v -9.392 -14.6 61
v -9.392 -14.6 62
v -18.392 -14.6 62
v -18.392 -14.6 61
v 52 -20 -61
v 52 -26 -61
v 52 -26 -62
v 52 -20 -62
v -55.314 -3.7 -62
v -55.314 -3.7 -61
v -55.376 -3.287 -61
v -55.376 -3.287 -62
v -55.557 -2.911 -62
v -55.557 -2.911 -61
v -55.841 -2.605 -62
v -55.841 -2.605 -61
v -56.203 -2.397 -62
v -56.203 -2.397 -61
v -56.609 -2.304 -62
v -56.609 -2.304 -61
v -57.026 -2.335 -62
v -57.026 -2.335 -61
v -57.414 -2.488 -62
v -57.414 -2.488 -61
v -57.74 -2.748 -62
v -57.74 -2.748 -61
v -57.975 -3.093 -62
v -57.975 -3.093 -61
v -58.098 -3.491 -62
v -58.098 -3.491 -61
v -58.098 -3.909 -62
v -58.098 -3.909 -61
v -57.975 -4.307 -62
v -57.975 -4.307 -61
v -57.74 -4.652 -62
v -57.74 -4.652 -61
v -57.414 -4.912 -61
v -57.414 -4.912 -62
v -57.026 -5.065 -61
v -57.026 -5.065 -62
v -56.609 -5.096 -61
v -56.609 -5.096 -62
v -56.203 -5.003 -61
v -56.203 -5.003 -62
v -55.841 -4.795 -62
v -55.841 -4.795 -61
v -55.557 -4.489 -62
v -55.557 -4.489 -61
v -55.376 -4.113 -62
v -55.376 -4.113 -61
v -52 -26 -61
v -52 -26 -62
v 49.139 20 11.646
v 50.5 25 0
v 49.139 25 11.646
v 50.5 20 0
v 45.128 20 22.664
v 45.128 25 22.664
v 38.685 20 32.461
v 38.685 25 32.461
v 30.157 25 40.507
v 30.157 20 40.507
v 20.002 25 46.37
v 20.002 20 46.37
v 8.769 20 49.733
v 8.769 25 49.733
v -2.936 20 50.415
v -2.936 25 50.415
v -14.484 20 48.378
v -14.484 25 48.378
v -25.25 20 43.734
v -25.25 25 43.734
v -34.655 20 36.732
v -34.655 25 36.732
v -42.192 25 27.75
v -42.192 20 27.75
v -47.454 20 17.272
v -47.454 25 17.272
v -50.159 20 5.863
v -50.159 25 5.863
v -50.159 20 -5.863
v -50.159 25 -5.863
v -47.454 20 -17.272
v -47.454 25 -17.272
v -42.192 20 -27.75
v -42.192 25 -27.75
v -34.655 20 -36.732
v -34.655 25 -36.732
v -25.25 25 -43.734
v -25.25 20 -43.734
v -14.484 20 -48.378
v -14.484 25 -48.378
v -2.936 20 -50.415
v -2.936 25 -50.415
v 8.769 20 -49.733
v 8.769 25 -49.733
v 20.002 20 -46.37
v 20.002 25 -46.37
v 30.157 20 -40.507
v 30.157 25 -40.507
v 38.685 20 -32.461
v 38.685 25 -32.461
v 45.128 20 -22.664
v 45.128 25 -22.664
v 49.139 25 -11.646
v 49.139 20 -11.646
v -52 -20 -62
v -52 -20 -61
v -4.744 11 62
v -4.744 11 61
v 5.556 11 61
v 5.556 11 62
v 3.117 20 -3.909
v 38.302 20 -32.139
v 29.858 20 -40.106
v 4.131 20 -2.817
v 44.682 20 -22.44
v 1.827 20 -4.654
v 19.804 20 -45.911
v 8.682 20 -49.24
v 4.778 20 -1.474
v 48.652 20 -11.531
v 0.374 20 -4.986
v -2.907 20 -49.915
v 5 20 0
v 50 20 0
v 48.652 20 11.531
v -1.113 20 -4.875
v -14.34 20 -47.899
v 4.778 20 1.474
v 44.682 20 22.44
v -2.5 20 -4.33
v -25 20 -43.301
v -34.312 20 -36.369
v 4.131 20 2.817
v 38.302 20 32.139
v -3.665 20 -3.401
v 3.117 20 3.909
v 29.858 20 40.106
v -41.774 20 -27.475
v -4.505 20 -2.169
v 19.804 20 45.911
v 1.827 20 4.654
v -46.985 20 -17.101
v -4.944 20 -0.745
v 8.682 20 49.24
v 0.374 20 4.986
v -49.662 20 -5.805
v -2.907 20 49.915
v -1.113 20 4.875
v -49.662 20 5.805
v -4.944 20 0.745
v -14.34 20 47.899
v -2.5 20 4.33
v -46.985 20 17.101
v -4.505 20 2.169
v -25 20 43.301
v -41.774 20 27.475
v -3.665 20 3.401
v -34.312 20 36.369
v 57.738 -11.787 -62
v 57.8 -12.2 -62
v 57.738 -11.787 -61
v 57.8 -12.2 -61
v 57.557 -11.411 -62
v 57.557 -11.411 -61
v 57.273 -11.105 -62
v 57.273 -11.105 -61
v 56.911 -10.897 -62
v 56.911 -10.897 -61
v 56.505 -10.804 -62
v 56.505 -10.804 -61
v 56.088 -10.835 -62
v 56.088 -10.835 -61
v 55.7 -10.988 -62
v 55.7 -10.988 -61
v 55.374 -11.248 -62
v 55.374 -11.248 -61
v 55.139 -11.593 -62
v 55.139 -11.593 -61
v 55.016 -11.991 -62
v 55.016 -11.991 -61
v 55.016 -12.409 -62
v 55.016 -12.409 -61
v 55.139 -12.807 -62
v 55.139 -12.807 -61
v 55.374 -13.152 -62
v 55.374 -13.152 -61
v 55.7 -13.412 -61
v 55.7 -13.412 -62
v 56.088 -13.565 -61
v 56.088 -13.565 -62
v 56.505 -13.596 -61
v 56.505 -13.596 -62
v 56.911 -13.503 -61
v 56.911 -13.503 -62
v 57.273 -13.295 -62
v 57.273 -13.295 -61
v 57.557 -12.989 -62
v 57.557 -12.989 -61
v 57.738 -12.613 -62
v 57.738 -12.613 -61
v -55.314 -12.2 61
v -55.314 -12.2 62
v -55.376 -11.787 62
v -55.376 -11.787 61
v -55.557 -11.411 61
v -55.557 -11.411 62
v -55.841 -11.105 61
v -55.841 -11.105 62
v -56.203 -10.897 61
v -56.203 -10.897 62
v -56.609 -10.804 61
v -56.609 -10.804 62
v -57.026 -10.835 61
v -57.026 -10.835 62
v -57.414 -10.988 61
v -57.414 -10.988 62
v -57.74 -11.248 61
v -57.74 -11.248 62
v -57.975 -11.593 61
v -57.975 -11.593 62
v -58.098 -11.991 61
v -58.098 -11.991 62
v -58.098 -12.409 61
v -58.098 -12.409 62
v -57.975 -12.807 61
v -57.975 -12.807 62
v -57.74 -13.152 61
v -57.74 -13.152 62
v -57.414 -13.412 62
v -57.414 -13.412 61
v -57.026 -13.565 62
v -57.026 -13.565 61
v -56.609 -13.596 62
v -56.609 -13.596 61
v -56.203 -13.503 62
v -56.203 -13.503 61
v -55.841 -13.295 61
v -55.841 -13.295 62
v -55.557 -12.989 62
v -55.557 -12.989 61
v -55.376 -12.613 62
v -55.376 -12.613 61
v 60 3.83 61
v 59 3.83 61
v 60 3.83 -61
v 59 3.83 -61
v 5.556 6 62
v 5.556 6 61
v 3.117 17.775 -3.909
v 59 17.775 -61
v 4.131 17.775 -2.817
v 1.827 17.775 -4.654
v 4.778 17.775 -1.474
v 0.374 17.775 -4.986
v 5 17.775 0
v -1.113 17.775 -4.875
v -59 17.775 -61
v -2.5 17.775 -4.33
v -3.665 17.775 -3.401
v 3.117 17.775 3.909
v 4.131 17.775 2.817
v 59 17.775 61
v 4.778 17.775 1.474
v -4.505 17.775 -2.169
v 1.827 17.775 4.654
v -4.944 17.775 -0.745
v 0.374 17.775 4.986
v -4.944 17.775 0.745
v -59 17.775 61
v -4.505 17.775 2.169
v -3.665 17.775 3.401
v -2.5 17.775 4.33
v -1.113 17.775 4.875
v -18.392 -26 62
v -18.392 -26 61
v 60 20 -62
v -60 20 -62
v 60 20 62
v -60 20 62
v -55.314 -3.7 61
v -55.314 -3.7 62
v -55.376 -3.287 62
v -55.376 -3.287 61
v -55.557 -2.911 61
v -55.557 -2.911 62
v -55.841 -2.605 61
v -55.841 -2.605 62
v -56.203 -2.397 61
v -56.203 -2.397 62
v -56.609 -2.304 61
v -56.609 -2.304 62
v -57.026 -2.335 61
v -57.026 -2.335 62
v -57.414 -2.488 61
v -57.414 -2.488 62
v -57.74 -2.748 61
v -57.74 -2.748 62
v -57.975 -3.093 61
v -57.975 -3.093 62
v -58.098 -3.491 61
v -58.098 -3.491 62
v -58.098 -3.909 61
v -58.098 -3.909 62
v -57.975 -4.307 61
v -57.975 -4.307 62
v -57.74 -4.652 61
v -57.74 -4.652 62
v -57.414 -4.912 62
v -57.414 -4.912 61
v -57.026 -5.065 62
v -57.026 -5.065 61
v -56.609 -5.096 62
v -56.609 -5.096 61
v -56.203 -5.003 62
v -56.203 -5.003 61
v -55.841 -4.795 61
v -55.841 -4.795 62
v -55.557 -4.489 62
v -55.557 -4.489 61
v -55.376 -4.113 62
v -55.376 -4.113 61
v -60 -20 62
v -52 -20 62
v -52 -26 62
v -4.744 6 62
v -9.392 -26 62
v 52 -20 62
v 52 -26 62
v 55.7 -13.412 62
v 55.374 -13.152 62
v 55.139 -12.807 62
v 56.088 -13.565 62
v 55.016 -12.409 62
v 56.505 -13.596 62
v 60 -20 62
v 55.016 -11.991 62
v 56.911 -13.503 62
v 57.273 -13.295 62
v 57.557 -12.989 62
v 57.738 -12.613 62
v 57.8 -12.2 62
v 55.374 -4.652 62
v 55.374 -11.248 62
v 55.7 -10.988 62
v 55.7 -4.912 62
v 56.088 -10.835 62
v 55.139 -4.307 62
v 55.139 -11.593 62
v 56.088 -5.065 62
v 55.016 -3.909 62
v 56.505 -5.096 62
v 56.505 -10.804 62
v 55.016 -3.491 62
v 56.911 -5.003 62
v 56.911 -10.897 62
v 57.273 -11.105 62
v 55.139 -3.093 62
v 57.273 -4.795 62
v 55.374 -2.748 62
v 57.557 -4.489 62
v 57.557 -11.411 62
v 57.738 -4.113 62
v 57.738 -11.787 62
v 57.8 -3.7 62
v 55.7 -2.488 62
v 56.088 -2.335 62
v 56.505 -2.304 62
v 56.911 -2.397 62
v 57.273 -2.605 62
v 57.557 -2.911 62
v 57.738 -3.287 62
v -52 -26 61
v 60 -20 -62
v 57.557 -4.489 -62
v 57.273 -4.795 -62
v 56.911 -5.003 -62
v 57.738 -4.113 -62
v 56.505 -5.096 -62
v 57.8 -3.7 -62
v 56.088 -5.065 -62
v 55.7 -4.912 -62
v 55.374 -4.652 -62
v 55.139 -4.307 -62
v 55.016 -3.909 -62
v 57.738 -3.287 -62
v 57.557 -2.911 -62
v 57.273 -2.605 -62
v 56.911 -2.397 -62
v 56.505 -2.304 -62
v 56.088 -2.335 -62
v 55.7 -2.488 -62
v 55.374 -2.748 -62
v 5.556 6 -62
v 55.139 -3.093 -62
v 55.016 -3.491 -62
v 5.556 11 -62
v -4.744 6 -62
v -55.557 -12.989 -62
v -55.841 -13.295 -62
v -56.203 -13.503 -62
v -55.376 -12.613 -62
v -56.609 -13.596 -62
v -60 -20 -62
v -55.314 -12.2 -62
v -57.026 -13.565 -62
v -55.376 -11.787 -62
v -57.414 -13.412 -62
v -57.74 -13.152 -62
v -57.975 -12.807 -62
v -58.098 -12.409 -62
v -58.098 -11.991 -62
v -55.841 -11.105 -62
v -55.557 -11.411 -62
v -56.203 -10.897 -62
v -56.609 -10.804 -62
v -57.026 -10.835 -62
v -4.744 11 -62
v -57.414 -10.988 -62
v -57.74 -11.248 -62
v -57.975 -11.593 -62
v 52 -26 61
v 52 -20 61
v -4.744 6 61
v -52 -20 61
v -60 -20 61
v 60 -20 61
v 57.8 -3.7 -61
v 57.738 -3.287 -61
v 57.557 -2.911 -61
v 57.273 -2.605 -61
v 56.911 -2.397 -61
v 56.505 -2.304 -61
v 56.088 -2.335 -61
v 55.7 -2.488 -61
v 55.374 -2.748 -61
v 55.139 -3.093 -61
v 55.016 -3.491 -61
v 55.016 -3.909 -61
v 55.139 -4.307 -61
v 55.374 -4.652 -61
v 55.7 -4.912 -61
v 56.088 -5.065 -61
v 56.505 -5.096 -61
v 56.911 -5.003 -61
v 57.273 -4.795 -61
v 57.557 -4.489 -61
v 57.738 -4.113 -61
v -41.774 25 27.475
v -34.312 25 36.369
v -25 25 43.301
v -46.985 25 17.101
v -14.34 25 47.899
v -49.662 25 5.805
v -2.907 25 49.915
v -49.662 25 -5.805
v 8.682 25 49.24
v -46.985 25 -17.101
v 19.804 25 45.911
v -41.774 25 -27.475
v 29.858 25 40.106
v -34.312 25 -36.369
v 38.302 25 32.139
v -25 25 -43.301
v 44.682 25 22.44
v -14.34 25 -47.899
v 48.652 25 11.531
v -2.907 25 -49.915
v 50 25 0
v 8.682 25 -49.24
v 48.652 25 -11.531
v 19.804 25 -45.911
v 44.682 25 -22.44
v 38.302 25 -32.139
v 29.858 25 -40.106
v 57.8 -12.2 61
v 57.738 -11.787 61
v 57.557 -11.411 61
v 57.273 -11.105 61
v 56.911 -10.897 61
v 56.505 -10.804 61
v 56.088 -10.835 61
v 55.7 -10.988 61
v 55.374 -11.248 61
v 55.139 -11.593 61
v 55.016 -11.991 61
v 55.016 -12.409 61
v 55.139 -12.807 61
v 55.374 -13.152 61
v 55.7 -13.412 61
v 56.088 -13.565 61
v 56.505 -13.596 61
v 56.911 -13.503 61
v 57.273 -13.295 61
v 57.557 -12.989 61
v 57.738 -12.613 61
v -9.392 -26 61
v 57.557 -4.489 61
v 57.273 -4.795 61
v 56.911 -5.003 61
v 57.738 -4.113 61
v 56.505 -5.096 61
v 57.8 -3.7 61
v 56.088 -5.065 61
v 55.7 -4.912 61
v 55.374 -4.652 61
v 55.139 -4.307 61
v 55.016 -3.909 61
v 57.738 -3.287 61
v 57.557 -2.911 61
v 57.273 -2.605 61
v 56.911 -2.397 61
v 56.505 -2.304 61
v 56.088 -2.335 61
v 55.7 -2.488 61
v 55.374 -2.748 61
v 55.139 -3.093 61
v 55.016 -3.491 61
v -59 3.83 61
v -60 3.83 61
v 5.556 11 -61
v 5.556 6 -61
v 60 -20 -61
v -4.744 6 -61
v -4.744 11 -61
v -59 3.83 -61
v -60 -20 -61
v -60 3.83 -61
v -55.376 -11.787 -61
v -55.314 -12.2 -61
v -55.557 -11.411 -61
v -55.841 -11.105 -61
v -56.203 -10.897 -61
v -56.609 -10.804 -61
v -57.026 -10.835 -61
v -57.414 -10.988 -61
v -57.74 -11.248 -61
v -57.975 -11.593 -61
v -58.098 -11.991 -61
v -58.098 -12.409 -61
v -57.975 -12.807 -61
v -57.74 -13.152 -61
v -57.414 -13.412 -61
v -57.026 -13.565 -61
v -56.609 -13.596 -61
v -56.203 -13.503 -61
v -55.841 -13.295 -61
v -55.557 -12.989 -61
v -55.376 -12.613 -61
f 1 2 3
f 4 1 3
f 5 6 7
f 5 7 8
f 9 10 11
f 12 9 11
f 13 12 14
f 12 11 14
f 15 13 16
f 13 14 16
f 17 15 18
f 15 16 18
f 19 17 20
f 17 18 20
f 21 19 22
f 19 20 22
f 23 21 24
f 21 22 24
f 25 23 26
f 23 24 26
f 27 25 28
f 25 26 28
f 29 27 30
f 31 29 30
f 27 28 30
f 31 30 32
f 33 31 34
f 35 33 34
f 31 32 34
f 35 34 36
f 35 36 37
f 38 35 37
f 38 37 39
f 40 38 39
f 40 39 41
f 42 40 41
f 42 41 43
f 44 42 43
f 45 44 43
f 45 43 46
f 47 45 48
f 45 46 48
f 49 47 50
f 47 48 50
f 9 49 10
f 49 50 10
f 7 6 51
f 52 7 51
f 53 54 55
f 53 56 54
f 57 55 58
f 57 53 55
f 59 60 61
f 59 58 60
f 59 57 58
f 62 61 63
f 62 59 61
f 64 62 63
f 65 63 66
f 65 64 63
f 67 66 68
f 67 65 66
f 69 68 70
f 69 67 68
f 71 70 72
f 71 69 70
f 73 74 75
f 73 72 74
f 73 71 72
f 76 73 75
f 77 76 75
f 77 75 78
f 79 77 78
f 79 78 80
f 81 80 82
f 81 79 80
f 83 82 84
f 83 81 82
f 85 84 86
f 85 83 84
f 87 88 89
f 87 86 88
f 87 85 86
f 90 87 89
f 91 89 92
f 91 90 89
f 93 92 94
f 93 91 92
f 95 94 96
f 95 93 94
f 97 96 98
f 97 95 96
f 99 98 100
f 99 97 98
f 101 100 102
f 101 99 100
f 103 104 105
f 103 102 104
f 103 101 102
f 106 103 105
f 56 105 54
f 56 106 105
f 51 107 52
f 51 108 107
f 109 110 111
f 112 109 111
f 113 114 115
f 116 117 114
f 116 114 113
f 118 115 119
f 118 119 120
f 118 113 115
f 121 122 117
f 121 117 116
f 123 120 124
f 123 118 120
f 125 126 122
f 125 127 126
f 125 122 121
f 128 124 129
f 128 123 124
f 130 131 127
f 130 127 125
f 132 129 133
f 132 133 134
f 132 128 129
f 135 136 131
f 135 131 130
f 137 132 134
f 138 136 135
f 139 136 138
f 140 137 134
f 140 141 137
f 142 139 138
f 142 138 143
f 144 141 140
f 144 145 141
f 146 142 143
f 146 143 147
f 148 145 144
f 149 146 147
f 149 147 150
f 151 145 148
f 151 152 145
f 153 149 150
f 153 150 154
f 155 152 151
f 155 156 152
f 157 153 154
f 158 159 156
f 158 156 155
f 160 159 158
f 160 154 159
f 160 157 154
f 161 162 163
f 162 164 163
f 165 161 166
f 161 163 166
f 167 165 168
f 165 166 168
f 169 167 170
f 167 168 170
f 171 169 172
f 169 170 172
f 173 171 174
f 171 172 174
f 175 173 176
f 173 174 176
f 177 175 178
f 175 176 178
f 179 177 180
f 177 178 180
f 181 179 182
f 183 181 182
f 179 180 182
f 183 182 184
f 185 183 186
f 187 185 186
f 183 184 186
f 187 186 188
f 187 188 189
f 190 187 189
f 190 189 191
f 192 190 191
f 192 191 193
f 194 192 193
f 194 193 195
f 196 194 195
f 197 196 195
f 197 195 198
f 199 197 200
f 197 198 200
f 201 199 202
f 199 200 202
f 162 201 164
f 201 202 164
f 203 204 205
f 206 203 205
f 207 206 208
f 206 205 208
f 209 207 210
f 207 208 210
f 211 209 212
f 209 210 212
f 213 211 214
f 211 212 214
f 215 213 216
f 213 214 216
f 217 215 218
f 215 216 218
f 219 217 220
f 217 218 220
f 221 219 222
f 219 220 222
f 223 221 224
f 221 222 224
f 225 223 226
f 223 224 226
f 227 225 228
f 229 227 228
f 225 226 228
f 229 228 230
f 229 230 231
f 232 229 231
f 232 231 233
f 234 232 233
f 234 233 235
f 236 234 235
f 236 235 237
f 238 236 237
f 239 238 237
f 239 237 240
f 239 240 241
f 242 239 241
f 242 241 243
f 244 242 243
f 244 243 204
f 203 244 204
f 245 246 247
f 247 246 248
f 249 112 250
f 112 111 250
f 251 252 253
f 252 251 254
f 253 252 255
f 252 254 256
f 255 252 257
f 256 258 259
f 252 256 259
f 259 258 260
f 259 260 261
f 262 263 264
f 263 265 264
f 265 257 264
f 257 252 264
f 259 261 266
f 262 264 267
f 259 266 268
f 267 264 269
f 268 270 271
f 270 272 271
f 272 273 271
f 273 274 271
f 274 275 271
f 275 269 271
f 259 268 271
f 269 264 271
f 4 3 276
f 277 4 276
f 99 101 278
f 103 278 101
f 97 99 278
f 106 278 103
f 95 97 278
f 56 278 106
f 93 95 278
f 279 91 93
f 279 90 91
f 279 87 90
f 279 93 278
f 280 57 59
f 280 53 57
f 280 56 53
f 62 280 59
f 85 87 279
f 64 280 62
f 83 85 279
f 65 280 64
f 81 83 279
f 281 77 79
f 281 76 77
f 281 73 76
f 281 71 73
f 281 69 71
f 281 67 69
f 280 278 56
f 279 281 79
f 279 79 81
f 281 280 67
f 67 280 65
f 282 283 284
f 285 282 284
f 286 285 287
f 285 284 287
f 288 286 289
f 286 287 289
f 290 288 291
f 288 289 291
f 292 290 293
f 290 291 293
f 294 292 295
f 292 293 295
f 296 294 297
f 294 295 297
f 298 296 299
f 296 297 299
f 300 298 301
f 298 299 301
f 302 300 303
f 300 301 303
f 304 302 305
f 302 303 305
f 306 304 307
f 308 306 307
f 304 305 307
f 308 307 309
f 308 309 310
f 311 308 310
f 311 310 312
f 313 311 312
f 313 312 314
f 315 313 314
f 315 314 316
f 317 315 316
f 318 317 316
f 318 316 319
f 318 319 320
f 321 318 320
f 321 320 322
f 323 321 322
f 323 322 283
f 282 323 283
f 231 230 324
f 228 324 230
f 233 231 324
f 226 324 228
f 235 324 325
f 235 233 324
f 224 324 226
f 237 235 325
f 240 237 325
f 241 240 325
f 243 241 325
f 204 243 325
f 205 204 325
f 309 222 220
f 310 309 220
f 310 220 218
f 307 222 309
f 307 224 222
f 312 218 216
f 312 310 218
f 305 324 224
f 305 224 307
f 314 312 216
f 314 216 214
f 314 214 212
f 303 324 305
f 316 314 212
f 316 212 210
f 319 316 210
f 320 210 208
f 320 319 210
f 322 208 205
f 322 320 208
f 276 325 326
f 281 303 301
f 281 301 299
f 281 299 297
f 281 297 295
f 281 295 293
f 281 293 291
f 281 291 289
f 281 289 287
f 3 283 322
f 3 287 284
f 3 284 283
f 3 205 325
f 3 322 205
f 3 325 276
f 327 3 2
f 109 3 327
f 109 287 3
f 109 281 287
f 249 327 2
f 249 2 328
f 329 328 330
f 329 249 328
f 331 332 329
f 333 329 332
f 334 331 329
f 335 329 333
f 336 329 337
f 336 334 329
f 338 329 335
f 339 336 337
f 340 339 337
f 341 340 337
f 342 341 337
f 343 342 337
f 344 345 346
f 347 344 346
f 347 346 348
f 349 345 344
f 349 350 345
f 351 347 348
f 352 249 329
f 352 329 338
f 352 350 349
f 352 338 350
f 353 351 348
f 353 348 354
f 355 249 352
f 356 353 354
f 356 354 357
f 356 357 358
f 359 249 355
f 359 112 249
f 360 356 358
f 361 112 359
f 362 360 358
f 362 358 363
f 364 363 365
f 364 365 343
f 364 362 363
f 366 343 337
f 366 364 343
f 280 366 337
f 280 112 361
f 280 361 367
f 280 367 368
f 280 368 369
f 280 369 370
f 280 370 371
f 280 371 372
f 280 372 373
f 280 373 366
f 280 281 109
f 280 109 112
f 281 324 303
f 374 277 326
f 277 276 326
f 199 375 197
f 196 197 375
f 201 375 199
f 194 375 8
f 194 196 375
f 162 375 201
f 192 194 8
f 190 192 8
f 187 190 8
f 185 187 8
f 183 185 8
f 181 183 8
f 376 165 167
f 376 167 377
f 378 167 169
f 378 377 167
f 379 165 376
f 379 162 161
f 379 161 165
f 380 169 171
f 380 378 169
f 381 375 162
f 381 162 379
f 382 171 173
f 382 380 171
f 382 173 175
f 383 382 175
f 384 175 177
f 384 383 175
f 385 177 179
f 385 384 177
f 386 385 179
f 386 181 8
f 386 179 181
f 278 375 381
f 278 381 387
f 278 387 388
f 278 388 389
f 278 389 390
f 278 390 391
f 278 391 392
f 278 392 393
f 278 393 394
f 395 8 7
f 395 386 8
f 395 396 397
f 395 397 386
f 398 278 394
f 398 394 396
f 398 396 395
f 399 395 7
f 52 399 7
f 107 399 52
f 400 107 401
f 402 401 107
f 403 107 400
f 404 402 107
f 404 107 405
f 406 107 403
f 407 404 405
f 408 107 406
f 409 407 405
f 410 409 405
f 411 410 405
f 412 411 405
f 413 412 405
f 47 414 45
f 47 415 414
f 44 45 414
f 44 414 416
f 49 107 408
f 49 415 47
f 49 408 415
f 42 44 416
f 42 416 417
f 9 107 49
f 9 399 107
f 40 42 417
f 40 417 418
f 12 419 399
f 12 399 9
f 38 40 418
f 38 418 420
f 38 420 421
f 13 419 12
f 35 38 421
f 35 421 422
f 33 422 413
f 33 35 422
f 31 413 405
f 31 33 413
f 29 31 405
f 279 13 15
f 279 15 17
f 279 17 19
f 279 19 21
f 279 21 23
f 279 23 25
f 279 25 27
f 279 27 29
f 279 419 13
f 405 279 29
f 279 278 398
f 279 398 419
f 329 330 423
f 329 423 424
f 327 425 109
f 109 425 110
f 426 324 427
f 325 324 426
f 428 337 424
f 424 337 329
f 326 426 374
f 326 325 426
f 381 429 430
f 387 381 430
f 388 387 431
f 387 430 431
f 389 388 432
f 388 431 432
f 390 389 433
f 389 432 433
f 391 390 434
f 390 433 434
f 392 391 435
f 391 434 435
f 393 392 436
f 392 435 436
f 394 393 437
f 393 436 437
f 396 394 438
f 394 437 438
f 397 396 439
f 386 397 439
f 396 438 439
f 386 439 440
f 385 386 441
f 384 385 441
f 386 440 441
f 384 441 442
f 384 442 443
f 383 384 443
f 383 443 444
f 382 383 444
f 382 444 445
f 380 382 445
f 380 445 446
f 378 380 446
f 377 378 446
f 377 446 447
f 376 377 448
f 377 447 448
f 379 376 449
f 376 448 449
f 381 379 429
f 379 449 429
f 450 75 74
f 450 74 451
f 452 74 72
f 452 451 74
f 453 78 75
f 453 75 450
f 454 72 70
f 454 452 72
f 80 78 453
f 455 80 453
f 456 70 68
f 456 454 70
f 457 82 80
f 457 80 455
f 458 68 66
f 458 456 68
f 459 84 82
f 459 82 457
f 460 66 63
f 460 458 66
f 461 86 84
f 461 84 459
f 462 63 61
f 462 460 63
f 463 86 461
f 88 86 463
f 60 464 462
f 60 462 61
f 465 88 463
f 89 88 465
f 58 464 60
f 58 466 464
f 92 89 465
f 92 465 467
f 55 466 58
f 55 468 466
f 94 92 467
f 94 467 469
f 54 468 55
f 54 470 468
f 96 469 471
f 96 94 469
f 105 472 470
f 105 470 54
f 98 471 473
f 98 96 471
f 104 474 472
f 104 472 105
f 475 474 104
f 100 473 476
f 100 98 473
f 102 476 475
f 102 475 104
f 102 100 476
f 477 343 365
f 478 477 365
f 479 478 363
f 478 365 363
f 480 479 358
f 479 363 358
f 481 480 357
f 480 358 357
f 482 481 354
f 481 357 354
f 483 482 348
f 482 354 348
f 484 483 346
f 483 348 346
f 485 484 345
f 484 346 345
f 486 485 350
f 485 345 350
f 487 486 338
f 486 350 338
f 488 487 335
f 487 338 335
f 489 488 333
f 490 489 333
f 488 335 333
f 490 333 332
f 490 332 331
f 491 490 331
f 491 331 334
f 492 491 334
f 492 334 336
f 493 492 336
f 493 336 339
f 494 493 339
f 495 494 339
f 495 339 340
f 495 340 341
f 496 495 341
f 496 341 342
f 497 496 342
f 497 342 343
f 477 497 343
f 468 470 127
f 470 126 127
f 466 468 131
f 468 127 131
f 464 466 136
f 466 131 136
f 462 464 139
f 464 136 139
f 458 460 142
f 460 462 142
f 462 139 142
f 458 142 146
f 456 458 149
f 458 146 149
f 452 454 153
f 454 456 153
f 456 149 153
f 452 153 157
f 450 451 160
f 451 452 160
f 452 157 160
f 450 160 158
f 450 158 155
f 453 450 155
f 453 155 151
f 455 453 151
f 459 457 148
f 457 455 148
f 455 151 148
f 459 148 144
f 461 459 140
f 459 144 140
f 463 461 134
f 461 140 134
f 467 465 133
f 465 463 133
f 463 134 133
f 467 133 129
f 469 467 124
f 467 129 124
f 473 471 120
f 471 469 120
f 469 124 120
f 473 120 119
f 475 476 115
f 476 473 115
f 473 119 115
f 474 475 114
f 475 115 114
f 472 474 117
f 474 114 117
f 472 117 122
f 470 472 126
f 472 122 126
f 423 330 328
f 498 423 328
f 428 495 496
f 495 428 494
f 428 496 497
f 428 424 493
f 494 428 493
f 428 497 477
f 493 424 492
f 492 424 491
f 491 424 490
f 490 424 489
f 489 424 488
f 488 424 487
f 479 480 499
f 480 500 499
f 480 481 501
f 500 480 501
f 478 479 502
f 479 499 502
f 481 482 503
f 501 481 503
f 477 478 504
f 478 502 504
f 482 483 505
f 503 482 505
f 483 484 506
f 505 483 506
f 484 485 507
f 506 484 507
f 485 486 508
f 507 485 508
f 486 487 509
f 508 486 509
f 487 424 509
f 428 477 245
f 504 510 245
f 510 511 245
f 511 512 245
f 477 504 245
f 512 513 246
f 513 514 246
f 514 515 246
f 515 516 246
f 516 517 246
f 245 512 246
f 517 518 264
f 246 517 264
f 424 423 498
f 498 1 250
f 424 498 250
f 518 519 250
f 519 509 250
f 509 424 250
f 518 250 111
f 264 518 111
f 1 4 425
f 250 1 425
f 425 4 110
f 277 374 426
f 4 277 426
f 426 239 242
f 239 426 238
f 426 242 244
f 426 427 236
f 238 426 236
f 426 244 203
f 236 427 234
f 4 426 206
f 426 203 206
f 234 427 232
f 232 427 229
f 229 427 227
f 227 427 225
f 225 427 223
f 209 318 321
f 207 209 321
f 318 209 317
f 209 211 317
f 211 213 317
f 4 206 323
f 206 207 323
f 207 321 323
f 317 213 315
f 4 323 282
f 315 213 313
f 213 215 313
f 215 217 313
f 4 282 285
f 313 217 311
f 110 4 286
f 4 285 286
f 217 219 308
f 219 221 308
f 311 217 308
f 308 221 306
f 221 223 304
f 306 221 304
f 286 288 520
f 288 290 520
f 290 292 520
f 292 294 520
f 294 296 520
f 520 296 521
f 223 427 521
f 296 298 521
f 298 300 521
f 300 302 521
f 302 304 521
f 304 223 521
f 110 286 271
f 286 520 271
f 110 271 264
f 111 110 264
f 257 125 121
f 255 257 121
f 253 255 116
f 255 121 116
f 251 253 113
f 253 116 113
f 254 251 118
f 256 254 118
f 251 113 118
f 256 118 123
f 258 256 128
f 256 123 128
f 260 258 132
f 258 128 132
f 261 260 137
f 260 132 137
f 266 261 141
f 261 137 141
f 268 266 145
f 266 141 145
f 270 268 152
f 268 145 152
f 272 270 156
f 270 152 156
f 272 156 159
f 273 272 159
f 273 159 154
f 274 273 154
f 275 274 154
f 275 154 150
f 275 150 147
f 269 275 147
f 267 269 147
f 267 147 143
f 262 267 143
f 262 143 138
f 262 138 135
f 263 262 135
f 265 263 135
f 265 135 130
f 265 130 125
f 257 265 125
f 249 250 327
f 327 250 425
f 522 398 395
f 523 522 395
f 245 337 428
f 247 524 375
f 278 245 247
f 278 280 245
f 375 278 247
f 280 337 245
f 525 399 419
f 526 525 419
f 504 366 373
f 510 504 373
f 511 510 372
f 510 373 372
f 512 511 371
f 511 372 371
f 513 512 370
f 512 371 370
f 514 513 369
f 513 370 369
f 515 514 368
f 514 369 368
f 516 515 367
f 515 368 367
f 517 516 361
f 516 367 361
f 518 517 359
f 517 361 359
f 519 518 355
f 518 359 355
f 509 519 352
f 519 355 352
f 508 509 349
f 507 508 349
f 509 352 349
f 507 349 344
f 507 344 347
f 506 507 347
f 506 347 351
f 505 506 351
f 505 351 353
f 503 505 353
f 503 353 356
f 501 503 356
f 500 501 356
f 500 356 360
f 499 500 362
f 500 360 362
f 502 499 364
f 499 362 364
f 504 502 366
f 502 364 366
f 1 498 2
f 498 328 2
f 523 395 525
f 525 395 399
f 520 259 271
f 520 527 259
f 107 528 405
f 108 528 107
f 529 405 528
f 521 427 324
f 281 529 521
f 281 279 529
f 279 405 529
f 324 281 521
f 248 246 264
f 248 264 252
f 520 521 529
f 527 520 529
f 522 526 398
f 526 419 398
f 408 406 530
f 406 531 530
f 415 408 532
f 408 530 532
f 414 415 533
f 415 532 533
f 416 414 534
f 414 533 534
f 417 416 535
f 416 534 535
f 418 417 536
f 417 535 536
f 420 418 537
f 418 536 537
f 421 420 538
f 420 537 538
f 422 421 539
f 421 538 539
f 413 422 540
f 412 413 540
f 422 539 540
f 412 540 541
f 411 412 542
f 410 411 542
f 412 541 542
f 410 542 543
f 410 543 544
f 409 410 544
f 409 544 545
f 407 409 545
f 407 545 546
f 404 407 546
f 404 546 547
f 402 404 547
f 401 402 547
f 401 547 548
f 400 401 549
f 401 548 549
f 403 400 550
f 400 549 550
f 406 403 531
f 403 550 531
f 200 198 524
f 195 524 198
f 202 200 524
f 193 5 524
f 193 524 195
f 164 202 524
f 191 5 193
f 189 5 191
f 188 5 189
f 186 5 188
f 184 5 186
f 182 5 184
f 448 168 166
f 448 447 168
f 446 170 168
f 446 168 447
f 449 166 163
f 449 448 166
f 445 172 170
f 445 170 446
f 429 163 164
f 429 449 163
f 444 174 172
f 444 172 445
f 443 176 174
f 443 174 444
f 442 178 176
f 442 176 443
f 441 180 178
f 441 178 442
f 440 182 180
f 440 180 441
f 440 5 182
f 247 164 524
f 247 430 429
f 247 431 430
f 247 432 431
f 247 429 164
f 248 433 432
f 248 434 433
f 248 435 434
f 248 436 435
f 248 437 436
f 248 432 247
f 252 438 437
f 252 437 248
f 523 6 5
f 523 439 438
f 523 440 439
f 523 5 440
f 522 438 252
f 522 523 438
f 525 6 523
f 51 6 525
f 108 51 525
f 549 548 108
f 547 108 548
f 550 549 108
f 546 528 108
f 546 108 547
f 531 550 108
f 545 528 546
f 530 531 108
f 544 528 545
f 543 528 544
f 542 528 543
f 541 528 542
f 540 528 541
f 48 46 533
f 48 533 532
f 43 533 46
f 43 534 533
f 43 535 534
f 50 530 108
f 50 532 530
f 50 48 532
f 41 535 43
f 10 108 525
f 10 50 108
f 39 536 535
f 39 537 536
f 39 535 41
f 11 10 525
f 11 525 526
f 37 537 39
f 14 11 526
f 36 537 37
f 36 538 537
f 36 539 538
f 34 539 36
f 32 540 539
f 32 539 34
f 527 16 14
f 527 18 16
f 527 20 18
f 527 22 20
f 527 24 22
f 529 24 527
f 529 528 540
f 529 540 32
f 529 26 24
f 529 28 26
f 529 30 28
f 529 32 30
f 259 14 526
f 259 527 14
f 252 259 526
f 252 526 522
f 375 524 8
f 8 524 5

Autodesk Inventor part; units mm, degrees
ref_plane "YZ Plane" through (0, 0, 0) normal (1, 0, 0) x (0, 1, 0)
ref_plane "XZ Plane" through (0, 0, 0) normal (0, 1, 0) x (-1, 0, 0)
ref_plane "XY Plane" through (0, 0, 0) normal (0, 0, 1) x (1, 0, 0)
sketch "Sketch2" plane through (0, 0, 0) normal (0, 0, 1) x (1, 0, 0)
  line L0 (59.5, -20) -> (-59.5, -20)
  line L1 (-59.5, -20) -> (-59.5, 20)
  line L2 (-59.5, 20) -> (59.5, 20)
  line L3 (59.5, 20) -> (59.5, -20)
  line L4 (59.5, -20) -> (-59.5, 20) construction
  line L5 (-59.5, -20) -> (59.5, 20) construction
  line L6 (-59.5, -20) -> (-51.5, -20) construction
  line L7 (-51.5, -20) -> (-51.5, 4) construction
  line L8 (-51.5, 4) -> (-59.5, 4) construction
  line L9 (-59.5, 4) -> (-59.5, -20) construction
  circle A0 centre (-56.714, -3.7) radius 1.4
  circle A1 centre (-56.714, -12.2) radius 1.4
  line L10 (59.5, -20) -> (51.5, -20) construction
  line L11 (51.5, -20) -> (51.5, 4) construction
  line L12 (51.5, 4) -> (59.5, 4) construction
  line L13 (59.5, 4) -> (59.5, -20) construction
  circle A2 centre (56.4, -3.7) radius 1.4
  circle A3 centre (56.4, -12.2) radius 1.4
  line L14 (-4.7439, 11) -> (5.5561, 11)
  line L15 (5.5561, 11) -> (5.5561, 6)
  line L16 (5.5561, 6) -> (-4.7439, 6)
  line L17 (-4.7439, 6) -> (-4.7439, 11)
  line L18 (-56.714, -3.7) -> (-58.95, -3.7) construction
  point P0 (0, 0)
  dimension "d0" = 119
  dimension "d1" = 40
  dimension "d2" = 8
  dimension "d3" = 24
  dimension "d4" = 2.8
  dimension "d5" = 7.7
  dimension "d6" = 5.214
  dimension "d7" = 2.8
  dimension "d8" = 8.5
  dimension "d9" = 8
  dimension "d10" = 24
  dimension "d12" = 2.8
  dimension "d13" = 7.7
  dimension "d15" = 4.9
  dimension "d16" = 2.8
  dimension "d17" = 8.5
  dimension "d18" = 10.3
  dimension "d19" = 5
  dimension "d20" = 26
sketch "Sketch3" plane through (0, 0, 0) normal (0, 1, 0) x (-1, 0, 0)
  line L0 (-59, -61) -> (59, -61)
  line L1 (59, -61) -> (59, 61)
  line L2 (59, 61) -> (-59, 61)
  line L3 (-59, 61) -> (-59, -61)
  line L4 (-59, -61) -> (59, 61) construction
  line L5 (59, -61) -> (-59, 61) construction
  line L6 (-60, -62) -> (60, -62)
  line L7 (60, -62) -> (60, 62)
  line L8 (60, 62) -> (-60, 62)
  line L9 (-60, 62) -> (-60, -62)
  line L10 (-60, -62) -> (60, 62) construction
  line L11 (60, -62) -> (-60, 62) construction
  point P0 (0, 0)
  dimension "d21" = 118
  dimension "d22" = 122
  dimension "d23" = 120
  dimension "d24" = 124
extrude "Extrusion1" add sketch "Sketch3" along normal blind 20 and the other way blind 26 contours L3 L2 L1 L0 | L9 L8 L7 L6
extrude "Extrusion2" cut sketch "Sketch2" along normal mid plane 168.5875 contours A0 | A1 | A2 | A3 | L14 L15 L16 L17
extrude "Extrusion3" cut sketch "Sketch3" along normal blind 3.83 and the other way blind 27.3 contours L3 L2 L1 L0
sketch "Sketch4" plane through (0, 20, 0) normal (0, 1, 0) x (1, 0, 0)
  circle A0 centre (0, 0) radius 50
  circle A1 centre (0, 0) radius 50.5
  circle A2 centre (0, 0) radius 5
  dimension "d33" = 100
  dimension "d34" = 101
  dimension "d35" = 10
extrude "Extrusion4" cut sketch "Sketch4" along normal mid plane 10 contours A2
extrude "Extrusion5" add sketch "Sketch4" along normal blind 5 contours A1
sketch "Sketch5" plane through (-60, 20, 62) normal (0, 0, 1) x (1, 0, 0)
  line L0 (1, -46) -> (119, -46) projected
  line L1 (41.608, -46) -> (50.608, -46)
  line L2 (50.608, -46) -> (50.608, -34.6)
  line L3 (50.608, -34.6) -> (41.608, -34.6)
  line L4 (41.608, -34.6) -> (41.608, -46)
  point P0 (60, -20)
  dimension "d40" = 9
  dimension "d41" = 11.4
extrude "Extrusion6" cut sketch "Sketch5" against normal blind 5
sketch "Sketch6" plane through (60, -26, -62) normal (1, 0, 0) x (0, 0, -1)
  line L0 (-123, 0) -> (-123, 29.83) projected
  line L1 (-1, 0) -> (-1, 29.83) projected
  line L2 (-123, 29.83) -> (-1, 29.83)
  line L3 (-1, 29.83) -> (-1, 0)
  line L4 (-1, 0) -> (-123, 0)
  line L5 (-123, 0) -> (-123, 29.83)
  point P0 (-62, 26)
  point P1 (-124, 46)
extrude "Extrusion7" cut sketch "Sketch6" along normal blind 100 and the other way blind 1000
sketch "Sketch7" plane through (-60, 20, 62) normal (0, 0, 1) x (1, 0, 0)
  line L0 (0, 0) -> (0, -46) construction
  line L1 (0, 0) -> (0, -40) construction
  line L2 (0, -46) -> (0, -16.17) construction
  line L3 (0, -40) -> (8, -40) construction
  line L4 (120, -46) -> (120, 0) construction
  line L5 (120, 0) -> (120, -40) construction
  line L6 (120, -40) -> (112, -40) construction
  line L7 (112, -40) -> (112, -46) construction
  line L8 (8, -40) -> (8, -46) construction
  line L9 (0, -46) -> (120, -46) construction
  line L10 (0, -40) -> (8, -40)
  line L11 (8, -40) -> (8, -46)
  line L12 (120, -40) -> (112, -40)
  line L13 (112, -46) -> (112, -40)
  line L14 (0, -40) -> (0, -46)
  line L15 (0, -46) -> (8, -46)
  line L16 (120, -16.17) -> (120, -46) projected
  line L17 (120, -40) -> (120, -46)
  line L18 (120, -46) -> (112, -46)
  point P0 (60, -20)
  dimension "d55" = 40
  dimension "d56" = 8
  dimension "d57" = 40
  dimension "d58" = 8
extrude "Extrusion8" cut sketch "Sketch7" against normal blind 131.125
extrude "Extrusion9" cut sketch "Sketch3" along normal blind 17.775 contours L3 L2 L1 L0
properties part number "Upper_Housing"
